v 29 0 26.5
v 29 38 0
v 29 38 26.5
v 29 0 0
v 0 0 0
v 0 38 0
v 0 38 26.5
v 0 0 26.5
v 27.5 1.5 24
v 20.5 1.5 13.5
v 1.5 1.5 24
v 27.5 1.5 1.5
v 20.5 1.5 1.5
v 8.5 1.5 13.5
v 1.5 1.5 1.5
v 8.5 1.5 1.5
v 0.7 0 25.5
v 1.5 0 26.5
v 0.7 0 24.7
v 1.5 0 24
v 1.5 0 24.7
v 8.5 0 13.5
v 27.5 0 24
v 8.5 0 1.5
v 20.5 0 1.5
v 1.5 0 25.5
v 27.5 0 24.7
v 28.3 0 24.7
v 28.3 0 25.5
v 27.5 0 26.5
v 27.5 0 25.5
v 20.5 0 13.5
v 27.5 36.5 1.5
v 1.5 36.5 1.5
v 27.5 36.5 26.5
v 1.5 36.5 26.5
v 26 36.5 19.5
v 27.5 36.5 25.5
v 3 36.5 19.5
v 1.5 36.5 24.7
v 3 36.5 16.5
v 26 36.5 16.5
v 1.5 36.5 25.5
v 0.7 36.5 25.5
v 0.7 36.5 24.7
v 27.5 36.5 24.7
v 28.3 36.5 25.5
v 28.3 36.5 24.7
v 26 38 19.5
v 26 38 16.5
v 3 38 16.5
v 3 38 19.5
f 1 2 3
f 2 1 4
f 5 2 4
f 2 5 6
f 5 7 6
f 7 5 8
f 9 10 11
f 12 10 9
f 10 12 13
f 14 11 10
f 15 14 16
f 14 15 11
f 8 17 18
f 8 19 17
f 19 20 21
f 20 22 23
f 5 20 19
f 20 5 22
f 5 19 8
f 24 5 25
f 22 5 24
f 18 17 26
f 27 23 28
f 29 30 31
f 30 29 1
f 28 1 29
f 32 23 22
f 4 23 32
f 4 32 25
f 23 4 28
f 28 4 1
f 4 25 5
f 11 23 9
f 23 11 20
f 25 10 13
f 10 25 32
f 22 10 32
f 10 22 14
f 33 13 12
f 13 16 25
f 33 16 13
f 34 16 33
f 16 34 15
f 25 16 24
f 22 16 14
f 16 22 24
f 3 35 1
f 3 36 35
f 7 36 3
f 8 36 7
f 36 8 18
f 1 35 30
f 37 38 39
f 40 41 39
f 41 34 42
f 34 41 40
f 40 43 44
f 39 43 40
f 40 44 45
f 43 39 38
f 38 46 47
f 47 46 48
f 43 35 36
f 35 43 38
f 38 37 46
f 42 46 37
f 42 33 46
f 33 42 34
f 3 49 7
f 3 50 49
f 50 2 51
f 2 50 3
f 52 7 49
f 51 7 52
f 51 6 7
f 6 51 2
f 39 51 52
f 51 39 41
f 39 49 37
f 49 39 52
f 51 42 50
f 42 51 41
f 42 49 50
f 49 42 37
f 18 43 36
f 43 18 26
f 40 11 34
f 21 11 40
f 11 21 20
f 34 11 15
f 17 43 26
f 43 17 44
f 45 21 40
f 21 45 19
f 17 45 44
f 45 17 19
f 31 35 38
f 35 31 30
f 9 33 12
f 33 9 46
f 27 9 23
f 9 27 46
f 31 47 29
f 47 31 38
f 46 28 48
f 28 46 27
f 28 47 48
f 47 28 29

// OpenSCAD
l=35;
w=26;
h=25;
t=1.5;

slot=0.80;
trim=2.5;

module cutout(x,z,len,height)
{
    translate([x+t,-t,z+t]){
        cube([len,3*t,height]);
    }
}

// Bottom
cube([w+2*t,l+2*t,t]);


// Front
translate([0,0,0]){
    rotate([0,0,0]){ 
        difference(){
           cube([w+2*t,t,h+t]);
            
           translate([0,-t,h+t-trim]){
               cube([w*2*t,3*t,trim]);
           }
           //cutout(3,15,20,3);
           cutout(7,0,12,12);
        }
    }
}

// Back
translate([w+2*t,l+2*t,0]){
    rotate([0,0,180]){
        difference(){
           cube([w+2*t,t,h+t]);
            
            cutout(1.5,15,23,3);
        }
    }
}

// Left
translate([0,l+2*t,0]){
    rotate([0,0,-90]){ 
        difference() {
           cube([l+2*t,t,h+t]);
           translate([0,t-slot,h+t-slot-1]){
               cube([l+2*t,slot+.2,slot]);
           }
            //cutout(7.5,15,20,3);
        }
    }
}

// Right
translate([w+2*t,0,0]){
    rotate([0,0,90]){
        difference(){ 
           cube([l+2*t,t,h+t]);
            
            translate([0,t-slot,h+t-slot-1]){
               cube([l+2*t,slot+0.2,slot]);
           }
            //cutout(7.5,15,20,3);
            
        }
    }
}
